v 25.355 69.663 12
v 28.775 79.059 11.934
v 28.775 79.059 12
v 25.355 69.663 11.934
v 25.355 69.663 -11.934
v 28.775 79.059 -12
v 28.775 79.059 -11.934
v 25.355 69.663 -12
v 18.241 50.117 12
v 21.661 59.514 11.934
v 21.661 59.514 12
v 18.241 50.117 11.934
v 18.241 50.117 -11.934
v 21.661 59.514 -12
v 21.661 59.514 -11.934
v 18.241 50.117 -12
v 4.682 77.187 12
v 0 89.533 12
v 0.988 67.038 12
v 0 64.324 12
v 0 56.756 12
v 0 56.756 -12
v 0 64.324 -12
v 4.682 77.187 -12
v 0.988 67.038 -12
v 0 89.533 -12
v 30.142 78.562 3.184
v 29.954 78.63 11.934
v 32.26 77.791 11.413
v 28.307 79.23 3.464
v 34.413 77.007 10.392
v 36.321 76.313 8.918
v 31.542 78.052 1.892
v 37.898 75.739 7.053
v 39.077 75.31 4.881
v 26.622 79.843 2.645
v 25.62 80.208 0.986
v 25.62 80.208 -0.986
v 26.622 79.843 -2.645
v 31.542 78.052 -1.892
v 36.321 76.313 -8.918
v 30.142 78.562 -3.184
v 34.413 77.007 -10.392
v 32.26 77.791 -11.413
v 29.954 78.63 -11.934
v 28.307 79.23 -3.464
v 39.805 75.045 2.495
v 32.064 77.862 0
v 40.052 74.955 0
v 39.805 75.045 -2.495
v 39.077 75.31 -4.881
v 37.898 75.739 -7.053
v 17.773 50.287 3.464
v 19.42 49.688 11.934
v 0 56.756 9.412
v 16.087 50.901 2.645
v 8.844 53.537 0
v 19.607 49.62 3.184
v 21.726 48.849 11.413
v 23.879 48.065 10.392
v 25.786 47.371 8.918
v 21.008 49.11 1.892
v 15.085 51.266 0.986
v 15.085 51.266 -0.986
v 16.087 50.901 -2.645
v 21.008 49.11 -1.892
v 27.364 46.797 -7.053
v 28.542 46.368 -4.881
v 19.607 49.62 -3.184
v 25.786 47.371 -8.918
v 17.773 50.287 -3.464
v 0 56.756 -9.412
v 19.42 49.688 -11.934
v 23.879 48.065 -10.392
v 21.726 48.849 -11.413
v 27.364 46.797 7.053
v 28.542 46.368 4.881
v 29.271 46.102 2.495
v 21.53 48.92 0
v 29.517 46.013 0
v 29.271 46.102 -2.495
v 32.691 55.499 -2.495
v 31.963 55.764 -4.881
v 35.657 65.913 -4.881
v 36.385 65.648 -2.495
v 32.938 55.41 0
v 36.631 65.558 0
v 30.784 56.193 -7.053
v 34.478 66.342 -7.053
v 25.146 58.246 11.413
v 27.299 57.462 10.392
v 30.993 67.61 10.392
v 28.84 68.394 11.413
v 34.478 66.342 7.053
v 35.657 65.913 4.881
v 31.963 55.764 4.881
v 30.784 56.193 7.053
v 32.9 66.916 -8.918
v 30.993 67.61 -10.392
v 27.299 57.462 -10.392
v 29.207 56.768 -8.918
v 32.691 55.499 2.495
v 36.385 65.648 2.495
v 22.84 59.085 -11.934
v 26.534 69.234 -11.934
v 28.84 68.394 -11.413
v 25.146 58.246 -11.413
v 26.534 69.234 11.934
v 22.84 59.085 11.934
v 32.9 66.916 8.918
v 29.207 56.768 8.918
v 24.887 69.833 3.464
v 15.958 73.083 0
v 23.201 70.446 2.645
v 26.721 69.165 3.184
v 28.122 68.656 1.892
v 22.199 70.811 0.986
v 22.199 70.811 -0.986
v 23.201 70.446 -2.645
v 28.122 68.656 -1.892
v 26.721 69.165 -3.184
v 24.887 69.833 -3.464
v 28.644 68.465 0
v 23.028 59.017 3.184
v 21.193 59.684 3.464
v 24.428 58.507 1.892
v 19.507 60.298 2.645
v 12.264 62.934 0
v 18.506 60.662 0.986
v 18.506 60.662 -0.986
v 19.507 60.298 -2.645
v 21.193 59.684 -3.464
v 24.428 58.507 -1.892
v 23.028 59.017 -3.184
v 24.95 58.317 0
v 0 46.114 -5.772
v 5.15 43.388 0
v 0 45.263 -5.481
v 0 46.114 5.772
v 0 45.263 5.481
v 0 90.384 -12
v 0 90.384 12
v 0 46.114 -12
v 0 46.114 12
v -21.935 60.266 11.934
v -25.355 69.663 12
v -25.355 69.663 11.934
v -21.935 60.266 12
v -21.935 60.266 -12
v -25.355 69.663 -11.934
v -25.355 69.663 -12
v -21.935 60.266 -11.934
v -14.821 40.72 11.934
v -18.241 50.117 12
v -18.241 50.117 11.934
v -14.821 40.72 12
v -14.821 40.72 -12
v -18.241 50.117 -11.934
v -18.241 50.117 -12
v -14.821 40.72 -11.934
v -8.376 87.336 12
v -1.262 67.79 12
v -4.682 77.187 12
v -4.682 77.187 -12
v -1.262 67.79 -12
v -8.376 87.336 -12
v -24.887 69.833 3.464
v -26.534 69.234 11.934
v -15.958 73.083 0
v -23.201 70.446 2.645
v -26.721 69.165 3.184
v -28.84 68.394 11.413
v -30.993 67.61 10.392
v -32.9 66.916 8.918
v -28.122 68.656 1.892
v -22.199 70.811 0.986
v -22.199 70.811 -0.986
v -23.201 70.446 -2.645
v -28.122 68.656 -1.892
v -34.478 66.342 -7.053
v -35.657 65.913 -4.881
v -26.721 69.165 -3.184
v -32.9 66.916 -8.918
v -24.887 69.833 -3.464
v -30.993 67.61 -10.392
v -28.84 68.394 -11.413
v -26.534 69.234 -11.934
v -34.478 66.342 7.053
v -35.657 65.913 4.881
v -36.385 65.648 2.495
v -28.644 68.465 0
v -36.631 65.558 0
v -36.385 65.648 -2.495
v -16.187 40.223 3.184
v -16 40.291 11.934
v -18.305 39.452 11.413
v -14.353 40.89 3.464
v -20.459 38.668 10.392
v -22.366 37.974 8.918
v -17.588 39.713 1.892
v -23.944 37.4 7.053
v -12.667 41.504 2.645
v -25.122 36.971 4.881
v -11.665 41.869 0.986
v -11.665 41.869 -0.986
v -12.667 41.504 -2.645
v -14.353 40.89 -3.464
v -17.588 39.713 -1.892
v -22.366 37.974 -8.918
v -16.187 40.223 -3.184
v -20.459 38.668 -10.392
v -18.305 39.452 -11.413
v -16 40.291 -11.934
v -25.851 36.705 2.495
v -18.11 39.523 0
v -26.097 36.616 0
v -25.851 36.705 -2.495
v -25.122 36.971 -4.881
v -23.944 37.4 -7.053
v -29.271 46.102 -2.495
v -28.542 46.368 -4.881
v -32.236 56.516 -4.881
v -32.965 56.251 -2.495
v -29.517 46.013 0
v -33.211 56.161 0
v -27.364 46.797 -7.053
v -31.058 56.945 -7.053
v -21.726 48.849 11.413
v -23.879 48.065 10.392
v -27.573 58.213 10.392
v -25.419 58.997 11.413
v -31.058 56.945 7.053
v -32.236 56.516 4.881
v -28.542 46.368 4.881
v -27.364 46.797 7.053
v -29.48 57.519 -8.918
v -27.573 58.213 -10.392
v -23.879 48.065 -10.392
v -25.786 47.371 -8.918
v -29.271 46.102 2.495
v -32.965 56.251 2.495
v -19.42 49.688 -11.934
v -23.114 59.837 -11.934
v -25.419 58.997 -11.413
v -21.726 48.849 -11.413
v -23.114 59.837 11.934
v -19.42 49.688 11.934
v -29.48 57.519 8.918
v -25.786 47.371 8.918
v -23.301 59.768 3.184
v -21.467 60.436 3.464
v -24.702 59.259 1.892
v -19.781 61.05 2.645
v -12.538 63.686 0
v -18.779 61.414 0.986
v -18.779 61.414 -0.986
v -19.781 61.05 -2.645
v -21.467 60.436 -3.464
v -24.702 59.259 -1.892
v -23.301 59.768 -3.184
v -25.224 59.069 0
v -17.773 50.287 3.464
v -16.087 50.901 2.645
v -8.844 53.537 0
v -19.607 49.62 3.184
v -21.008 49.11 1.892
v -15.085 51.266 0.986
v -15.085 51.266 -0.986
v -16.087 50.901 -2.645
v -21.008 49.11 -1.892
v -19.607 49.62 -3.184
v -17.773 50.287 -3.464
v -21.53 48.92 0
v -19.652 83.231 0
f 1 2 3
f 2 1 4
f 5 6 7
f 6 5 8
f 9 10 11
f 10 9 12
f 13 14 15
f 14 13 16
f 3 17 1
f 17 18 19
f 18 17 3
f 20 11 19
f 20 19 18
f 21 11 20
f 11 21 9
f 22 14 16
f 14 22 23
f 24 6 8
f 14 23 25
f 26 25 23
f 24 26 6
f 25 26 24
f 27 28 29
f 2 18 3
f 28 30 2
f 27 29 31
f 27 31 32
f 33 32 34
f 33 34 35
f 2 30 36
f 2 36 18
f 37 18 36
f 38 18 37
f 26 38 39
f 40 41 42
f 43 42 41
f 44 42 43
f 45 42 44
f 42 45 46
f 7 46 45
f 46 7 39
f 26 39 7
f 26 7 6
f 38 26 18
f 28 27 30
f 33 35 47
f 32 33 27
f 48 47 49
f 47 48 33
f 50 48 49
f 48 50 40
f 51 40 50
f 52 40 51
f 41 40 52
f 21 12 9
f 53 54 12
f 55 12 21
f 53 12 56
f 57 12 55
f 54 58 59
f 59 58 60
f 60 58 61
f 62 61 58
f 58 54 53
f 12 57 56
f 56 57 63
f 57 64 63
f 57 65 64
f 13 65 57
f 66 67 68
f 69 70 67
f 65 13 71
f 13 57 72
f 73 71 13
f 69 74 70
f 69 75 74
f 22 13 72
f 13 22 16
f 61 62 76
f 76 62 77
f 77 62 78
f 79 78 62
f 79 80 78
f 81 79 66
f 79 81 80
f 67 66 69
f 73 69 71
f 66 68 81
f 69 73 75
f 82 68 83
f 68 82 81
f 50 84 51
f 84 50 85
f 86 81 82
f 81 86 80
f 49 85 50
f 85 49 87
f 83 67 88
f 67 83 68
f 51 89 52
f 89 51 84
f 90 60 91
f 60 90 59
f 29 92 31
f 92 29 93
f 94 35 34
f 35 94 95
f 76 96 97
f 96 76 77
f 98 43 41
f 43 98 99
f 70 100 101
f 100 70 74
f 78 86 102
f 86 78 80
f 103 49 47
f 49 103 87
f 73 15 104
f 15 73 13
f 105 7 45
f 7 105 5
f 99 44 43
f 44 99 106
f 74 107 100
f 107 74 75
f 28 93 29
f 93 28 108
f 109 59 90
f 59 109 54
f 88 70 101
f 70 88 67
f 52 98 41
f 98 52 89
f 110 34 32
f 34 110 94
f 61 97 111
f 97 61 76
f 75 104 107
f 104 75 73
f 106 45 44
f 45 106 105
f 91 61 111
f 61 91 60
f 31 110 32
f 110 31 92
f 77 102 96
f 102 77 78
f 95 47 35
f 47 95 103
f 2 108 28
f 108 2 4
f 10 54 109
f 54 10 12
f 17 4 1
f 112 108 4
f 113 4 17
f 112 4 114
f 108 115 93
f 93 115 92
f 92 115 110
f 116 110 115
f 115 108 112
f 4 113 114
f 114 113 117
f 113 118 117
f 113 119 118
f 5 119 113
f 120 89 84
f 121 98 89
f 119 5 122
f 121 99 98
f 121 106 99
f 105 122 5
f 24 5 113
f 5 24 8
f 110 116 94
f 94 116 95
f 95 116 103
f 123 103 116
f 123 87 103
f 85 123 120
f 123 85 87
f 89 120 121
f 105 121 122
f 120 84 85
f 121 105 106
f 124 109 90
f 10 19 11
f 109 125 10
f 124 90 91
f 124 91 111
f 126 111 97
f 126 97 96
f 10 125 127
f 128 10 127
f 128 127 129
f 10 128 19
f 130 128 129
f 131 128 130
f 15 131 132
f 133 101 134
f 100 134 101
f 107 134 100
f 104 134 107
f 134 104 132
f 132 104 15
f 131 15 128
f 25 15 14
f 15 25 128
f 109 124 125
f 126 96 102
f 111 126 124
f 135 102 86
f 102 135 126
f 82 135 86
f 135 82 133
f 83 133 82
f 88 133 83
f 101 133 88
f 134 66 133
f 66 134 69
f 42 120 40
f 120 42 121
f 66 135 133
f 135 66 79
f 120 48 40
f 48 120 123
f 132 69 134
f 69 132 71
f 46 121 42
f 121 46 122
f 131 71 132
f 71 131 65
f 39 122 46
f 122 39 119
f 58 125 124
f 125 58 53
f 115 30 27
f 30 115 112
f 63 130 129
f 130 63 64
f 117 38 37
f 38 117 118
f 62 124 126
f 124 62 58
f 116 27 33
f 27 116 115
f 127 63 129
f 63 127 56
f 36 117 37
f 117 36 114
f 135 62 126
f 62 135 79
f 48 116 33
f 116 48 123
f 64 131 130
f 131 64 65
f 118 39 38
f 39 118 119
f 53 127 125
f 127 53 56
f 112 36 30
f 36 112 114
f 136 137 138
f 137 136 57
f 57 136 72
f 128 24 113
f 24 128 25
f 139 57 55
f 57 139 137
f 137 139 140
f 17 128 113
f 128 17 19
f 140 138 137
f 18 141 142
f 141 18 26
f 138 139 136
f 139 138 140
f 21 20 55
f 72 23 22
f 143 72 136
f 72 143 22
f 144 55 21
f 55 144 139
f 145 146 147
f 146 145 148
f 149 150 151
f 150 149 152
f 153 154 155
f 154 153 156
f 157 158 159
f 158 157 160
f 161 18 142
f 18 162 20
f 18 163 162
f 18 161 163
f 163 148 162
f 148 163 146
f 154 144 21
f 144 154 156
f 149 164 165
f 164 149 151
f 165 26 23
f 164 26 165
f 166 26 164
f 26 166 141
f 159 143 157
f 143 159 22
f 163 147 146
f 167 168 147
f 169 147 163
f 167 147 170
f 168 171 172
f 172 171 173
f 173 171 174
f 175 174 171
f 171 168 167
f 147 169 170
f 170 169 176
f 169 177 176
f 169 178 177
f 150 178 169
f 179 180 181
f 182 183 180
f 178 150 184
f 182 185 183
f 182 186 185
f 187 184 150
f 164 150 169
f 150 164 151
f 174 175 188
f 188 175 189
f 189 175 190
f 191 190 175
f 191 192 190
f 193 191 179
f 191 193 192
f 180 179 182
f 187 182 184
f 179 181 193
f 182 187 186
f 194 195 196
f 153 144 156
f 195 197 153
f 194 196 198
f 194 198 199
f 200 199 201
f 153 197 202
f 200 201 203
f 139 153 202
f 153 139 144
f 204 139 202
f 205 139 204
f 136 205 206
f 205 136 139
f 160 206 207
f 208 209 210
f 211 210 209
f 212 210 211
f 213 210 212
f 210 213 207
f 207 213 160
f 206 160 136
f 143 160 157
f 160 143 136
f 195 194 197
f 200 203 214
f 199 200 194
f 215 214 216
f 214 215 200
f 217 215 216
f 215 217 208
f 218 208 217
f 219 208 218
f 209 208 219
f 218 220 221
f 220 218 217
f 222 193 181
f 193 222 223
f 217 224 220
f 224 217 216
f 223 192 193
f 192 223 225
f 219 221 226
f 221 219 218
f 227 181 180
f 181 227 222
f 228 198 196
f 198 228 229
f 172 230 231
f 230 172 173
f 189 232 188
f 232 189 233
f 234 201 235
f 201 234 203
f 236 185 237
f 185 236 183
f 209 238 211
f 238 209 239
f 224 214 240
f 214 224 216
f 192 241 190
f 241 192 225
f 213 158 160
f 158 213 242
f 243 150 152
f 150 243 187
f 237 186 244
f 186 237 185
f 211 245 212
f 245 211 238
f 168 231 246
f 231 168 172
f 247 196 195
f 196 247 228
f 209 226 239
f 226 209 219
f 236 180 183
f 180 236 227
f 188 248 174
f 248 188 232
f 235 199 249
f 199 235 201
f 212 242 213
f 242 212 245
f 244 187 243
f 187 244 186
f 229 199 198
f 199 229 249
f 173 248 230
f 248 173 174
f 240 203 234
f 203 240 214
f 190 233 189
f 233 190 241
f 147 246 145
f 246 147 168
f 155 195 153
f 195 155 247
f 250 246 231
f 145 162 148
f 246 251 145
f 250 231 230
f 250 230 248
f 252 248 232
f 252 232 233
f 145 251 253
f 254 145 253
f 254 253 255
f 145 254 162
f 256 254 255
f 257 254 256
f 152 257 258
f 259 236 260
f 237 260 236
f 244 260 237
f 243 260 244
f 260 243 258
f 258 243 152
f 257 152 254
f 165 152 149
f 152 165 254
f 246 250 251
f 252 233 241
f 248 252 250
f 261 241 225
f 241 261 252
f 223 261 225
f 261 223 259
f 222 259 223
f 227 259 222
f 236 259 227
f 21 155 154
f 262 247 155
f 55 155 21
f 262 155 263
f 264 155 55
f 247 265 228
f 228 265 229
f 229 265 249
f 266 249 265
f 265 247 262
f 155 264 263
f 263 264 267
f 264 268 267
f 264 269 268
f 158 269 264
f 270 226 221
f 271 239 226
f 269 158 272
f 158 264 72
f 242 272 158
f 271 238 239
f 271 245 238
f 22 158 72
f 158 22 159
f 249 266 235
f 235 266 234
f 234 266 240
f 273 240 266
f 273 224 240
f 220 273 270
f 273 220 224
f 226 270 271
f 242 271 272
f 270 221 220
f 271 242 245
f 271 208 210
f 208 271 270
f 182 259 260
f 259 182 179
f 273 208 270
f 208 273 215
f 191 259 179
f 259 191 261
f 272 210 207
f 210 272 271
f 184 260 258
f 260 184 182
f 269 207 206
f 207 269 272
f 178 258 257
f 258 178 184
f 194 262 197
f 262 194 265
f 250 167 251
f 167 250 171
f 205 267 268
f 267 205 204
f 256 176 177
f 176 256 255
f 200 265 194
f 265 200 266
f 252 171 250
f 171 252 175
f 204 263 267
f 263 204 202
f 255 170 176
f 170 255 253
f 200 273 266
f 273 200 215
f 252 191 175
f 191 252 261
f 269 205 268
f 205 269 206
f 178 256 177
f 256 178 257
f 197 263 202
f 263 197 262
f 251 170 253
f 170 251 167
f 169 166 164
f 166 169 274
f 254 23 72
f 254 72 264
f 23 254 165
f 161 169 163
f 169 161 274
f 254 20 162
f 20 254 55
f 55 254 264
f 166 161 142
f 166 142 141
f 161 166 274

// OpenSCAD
// file: ../Misc/Prism.scad
// taken from https://en.wikibooks.org/wiki/OpenSCAD_User_Manual/Primitive_Solids   
   
module prism(l, w, h){
   polyhedron(
           points=[[0,0,0], [l,0,0], [l,w,0], [0,w,0], [0,w,h], [l,w,h]],
           faces=[[0,1,2,3],[5,4,3,2],[0,4,5,1],[0,3,4],[5,2,1]]
           );
   }

prism(10, 5, 3);
// main file
use <../Misc/Prism.scad>

// dimension of one hinge part
depth = 24;
width = 60;

// diameters
round_size = 12;    
hole_size = 7/2;

// the part where ohter connectors go
gap_witdh = round_size * 2 + 10;

gap_epsilon = 0.8;
gap_height = 10;
gap_height_e = gap_height + gap_epsilon;

safety_margin = 10;

cap_end_round = 30 / 2;
cap_end_heigth = 4;

prism_middle = 10;

module hingepart(l1, l2, l3, gap, with_cap, solid_top, the_lower_one=false) {
    // the base model
    difference() {
        union() {
            cube([width - round_size, l2, depth]);
            
            translate([width - round_size, 0, depth / 2])
            rotate([-90, 0, 0])
            cylinder(l2, round_size, round_size);
            
            if (with_cap) {
                translate([width - round_size, l2 + safety_margin, depth / 2])
                rotate([-90, 0, 0])
                cylinder(l3, round_size, round_size);
                
                translate([width - round_size, l2 + l3 - cap_end_heigth + safety_margin, depth / 2])
                rotate([-90, 0, 0])
                cylinder(cap_end_heigth, cap_end_round, cap_end_round);
            }
            
            if (solid_top) {
                translate([width - round_size, l2, depth / 2])
                rotate([-90, 0, 0])
                cylinder(l3, round_size, round_size);
                
                translate([width - round_size, l2 + l3 - cap_end_heigth, depth / 2])
                rotate([-90, 0, 0])
                cylinder(cap_end_heigth, cap_end_round, cap_end_round);

            }
        }      
        if (gap) {
            // move gap to the middle of the part
            cut_gap_height = gap_height;
            translate([width - gap_witdh, cut_gap_height, 0])
            cube([width, gap_height_e, depth]);
            
            // cut out the two holes
            translate([width - round_size, 0, depth / 2])
            rotate([-90, 0, 0])
            
            cylinder(l2 + l3 + safety_margin, hole_size, hole_size);
        }
    }
    
    if (gap) {
        prism_height = 2 * gap_height_e + 2 * gap_height;
        prims_translate_y = the_lower_one ? prism_height : prism_height - gap_height_e;
        
         x = sqrt((depth / 2) * (depth / 2) + (depth / 2) * (depth / 2)); // pythagoras
        translate([width - gap_witdh, prims_translate_y, 0])
        rotate([45, 0, -90])
        prism(prism_height, x, x);
        
        
        translate_help_cube_y = !the_lower_one ? -gap_height_e : 0;
        translate([-8, translate_help_cube_y, 0]) // TODO
        cube([gap_witdh, prism_height, depth]);
    }
}


module draw_hinge(
    alpha,
    a_l1, a_l2, a_l3, a_gap, a_solid_top, a_with_cap,
    b_l1, b_l2, b_l3, b_gap, b_solid_top, b_with_cap) {
    
    a_angle = - alpha / 2;
    a_translate_x = a_l1 * cos(90 + a_angle);
    a_translate_y = a_l1 * sin(90 + a_angle);
    
        
    difference() {
        translate([a_translate_x, a_translate_y, 0])
        rotate([0, 0, a_angle])
        translate([-(width - round_size), 0, 0])
        translate([0, 0, -depth / 2]) // center on the z axis
        hingepart(a_l1, a_l2, a_l3, a_gap, a_with_cap, a_solid_top);
        
        // cut away parts that are on the on the other site
        translate([-100, 0, -50])
        cube([100, 100, 100]);
    }

    b_angle = alpha / 2;
    b_translate_x = b_l1 * cos(90 + b_angle);
    b_translate_y = b_l1 * sin(90 + b_angle);
    
    difference() {
        translate([b_translate_x, b_translate_y, 0])
        rotate([0, 0, b_angle])
        mirror([1, 0, 0])
        translate([-(width - round_size), 0, 0])
        translate([0, 0, -depth / 2])
        hingepart(b_l1, b_l2, b_l3, b_gap, b_with_cap, b_solid_top, the_lower_one=true);

        // cut away parts that are on the on the other site
        translate([0, 0, -50])
        cube([100, 100, 100]);        
    }
   
}


// linear function to get the optiomal distance to the origin
p1_x = 30;
p1_y = 60;

p2_x = 90;
p2_y = 20;

m = (p2_y - p1_y) / (p2_x - p1_x);
b = p1_y - m * p1_x;

function optimal_distance_origin(angle) = (
    m * angle + b
);

//connection_angle = 60;
connection_angle = 40;

distance_origin = optimal_distance_origin(connection_angle);
//distance_origin = 5s0;

elongation_length = 100;

a_l1 = distance_origin;
a_l2 = 3 * gap_height + gap_epsilon;
a_l3 = elongation_length - a_l1 - a_l2;

b_l1 = distance_origin - gap_height; // add epsilon?
b_l2 = a_l2;
b_l3 = elongation_length - b_l1 - b_l2;

//
//draw_hinge(alpha=connection_angle,
//    a_l1=l1, a_l2=l2, a_l3=l3, a_solid_top=true,
//    b_l1=l1, b_l2=l2, b_l3=l3, b_gap=true, b_with_cap=true);

//
//draw_hinge(alpha=connection_angle,
//    a_l1=a_l1, a_l2=a_l2, a_l3=a_l3, a_solid_top=true,
//    b_l1=b_l1, b_l2=b_l2, b_l3=b_l3, b_gap=true, b_with_cap=true);
    
//draw_hinge(alpha=connection_angle,
//    a_l1=a_l1, a_l2=a_l2, a_l3=a_l3, a_gap=true,
//    b_l1=b_l1, b_l2=b_l2, b_l3=b_l3, b_solid_top=true);
    
draw_hinge(alpha=connection_angle,
    a_l1=a_l1, a_l2=a_l2, a_l3=a_l3, a_gap=true,
    b_l1=b_l1, b_l2=b_l2, b_l3=b_l3, b_gap=true);  
        
